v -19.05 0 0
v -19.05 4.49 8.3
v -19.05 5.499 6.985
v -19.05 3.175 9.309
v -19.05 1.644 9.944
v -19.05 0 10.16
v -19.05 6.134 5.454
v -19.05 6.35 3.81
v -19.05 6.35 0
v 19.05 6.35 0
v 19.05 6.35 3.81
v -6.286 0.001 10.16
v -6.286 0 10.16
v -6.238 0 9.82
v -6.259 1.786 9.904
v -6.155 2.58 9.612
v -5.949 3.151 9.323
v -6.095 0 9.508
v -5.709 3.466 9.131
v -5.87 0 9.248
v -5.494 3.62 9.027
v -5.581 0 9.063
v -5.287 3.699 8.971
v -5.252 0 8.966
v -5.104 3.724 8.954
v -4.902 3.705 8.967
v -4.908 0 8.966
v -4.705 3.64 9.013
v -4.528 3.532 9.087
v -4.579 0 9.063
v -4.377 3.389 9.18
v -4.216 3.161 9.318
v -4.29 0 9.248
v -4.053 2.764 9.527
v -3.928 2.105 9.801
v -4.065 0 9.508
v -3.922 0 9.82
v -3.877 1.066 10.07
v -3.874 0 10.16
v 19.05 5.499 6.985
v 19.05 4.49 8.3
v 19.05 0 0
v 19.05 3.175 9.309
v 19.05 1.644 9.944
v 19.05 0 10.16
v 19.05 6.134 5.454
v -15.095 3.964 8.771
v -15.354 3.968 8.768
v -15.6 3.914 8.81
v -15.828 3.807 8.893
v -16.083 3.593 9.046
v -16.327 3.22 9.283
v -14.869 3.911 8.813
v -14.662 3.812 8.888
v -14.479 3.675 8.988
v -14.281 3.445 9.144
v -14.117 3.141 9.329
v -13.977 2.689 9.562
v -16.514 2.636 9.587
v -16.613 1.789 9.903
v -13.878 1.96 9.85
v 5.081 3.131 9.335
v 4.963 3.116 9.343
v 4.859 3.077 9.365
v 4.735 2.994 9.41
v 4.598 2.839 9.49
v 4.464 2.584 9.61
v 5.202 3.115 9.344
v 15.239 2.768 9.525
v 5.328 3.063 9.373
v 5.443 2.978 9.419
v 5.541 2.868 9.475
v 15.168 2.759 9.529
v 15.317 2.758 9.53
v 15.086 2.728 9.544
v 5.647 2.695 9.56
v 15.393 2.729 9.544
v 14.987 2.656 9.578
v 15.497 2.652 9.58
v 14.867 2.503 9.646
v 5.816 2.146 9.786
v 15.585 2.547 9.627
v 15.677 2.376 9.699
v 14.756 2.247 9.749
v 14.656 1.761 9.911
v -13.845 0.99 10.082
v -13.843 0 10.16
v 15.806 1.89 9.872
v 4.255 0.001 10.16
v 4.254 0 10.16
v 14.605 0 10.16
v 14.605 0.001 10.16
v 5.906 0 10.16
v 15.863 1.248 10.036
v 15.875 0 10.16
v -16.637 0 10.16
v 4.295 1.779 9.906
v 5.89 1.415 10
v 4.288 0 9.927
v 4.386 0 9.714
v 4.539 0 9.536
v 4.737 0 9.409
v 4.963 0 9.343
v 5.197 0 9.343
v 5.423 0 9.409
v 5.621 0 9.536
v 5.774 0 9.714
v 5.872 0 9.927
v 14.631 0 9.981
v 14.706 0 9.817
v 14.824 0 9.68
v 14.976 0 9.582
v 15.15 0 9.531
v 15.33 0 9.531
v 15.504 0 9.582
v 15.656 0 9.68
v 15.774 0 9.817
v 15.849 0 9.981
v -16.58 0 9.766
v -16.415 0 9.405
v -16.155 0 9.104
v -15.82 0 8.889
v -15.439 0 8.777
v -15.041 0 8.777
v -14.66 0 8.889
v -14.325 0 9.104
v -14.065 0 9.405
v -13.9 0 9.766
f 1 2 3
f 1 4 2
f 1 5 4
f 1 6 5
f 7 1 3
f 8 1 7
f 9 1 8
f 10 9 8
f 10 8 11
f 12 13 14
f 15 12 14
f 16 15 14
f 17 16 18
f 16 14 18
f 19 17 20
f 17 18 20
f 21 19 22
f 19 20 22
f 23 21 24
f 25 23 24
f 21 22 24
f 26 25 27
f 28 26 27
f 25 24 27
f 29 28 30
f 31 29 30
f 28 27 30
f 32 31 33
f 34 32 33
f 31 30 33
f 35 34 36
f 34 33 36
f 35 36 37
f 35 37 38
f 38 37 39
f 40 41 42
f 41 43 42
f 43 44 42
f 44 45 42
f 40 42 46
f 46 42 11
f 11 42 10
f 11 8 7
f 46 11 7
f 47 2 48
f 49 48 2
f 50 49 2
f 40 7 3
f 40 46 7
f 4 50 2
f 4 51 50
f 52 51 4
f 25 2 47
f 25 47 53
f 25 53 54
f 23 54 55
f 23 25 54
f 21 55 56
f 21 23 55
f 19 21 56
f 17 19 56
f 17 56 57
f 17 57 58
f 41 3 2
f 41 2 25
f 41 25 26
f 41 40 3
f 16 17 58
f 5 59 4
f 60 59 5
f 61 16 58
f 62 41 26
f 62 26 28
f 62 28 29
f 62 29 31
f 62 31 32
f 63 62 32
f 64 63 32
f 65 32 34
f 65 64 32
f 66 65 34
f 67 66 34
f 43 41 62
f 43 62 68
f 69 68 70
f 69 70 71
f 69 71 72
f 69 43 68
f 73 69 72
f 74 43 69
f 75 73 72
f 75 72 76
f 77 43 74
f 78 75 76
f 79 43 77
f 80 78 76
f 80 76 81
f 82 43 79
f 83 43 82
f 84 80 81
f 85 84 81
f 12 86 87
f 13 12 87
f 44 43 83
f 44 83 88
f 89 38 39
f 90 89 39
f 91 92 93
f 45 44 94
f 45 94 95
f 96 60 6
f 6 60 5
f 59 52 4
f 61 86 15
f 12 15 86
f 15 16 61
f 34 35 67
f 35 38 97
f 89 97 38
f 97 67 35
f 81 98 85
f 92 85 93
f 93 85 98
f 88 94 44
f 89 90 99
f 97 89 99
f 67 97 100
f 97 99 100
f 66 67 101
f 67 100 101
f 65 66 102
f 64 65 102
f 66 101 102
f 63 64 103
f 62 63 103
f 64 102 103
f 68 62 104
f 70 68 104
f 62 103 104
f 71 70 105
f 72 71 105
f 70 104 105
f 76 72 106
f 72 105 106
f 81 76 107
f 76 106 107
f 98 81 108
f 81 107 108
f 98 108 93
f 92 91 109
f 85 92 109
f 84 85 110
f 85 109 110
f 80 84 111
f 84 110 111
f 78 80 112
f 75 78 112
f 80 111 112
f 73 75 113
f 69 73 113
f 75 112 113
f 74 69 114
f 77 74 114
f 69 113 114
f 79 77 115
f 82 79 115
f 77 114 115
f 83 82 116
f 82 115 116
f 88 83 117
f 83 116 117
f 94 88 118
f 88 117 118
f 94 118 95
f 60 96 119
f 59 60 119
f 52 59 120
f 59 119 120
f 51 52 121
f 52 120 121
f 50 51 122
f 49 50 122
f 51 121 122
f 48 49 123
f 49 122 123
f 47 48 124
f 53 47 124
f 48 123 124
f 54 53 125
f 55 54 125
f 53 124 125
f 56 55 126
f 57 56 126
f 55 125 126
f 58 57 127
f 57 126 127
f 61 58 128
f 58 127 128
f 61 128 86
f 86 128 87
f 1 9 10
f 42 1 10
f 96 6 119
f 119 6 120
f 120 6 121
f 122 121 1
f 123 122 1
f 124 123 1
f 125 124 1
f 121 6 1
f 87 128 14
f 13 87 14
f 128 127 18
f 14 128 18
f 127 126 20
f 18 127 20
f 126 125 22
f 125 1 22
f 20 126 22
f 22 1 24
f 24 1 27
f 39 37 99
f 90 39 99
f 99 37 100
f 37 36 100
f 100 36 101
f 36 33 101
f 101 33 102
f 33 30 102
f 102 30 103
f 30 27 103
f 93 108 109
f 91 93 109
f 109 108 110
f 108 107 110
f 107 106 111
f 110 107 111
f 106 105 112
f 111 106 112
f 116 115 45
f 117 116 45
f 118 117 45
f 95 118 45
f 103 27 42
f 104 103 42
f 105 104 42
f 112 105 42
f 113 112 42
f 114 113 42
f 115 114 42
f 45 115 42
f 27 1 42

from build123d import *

# Parameters (mm, degrees)
F0_W     = 38.1
F0_H     = 6.35
F1_DEPTH = 10.16
F2_R     = 6.34999
F4_DEPTH = 25.4


# Not quite as in the source:
# - a fillet or chamfer is up to 0.001 mm smaller than in the source, because OpenCascade refuses the exact size


with BuildPart() as f1:
    # F0 (on Top) → F1 (new body)
    with BuildSketch(Plane.XY):
        with Locations((0, 3.175)):
            Rectangle(F0_W, F0_H)
    extrude(amount=F1_DEPTH)

    # F2 (radius 6.35 in the source; OpenCascade refuses exactly that, so slightly less here)
    f2_edges = [f1.edges().sort_by_distance(p)[0] for p in [
        (0, 6.35, 10.16),
    ]]
    fillet(f2_edges, radius=F2_R)

    # F3 (on face) → F4 (cut)
    with BuildSketch(Plane.XZ):
        with BuildLine():
            ThreePointArc((-16.637, 10.16), (-15.24, 8.763), (-13.843, 10.16))
            Line((-13.843, 10.16), (-16.637, 10.16))
        make_face()
        with BuildLine():
            Line((-3.8735, 10.16), (-6.2865, 10.16))
            ThreePointArc((-6.2865, 10.16), (-5.08, 8.9535), (-3.8735, 10.16))
        make_face()
        with BuildLine():
            Line((5.9055, 10.16), (4.2545, 10.16))
            ThreePointArc((4.2545, 10.16), (5.08, 9.3345), (5.9055, 10.16))
        make_face()
        with BuildLine():
            Line((15.875, 10.16), (14.605, 10.16))
            ThreePointArc((14.605, 10.16), (15.24, 9.525), (15.875, 10.16))
        make_face()
    extrude(amount=-F4_DEPTH, mode=Mode.SUBTRACT)


solid = f1.part
